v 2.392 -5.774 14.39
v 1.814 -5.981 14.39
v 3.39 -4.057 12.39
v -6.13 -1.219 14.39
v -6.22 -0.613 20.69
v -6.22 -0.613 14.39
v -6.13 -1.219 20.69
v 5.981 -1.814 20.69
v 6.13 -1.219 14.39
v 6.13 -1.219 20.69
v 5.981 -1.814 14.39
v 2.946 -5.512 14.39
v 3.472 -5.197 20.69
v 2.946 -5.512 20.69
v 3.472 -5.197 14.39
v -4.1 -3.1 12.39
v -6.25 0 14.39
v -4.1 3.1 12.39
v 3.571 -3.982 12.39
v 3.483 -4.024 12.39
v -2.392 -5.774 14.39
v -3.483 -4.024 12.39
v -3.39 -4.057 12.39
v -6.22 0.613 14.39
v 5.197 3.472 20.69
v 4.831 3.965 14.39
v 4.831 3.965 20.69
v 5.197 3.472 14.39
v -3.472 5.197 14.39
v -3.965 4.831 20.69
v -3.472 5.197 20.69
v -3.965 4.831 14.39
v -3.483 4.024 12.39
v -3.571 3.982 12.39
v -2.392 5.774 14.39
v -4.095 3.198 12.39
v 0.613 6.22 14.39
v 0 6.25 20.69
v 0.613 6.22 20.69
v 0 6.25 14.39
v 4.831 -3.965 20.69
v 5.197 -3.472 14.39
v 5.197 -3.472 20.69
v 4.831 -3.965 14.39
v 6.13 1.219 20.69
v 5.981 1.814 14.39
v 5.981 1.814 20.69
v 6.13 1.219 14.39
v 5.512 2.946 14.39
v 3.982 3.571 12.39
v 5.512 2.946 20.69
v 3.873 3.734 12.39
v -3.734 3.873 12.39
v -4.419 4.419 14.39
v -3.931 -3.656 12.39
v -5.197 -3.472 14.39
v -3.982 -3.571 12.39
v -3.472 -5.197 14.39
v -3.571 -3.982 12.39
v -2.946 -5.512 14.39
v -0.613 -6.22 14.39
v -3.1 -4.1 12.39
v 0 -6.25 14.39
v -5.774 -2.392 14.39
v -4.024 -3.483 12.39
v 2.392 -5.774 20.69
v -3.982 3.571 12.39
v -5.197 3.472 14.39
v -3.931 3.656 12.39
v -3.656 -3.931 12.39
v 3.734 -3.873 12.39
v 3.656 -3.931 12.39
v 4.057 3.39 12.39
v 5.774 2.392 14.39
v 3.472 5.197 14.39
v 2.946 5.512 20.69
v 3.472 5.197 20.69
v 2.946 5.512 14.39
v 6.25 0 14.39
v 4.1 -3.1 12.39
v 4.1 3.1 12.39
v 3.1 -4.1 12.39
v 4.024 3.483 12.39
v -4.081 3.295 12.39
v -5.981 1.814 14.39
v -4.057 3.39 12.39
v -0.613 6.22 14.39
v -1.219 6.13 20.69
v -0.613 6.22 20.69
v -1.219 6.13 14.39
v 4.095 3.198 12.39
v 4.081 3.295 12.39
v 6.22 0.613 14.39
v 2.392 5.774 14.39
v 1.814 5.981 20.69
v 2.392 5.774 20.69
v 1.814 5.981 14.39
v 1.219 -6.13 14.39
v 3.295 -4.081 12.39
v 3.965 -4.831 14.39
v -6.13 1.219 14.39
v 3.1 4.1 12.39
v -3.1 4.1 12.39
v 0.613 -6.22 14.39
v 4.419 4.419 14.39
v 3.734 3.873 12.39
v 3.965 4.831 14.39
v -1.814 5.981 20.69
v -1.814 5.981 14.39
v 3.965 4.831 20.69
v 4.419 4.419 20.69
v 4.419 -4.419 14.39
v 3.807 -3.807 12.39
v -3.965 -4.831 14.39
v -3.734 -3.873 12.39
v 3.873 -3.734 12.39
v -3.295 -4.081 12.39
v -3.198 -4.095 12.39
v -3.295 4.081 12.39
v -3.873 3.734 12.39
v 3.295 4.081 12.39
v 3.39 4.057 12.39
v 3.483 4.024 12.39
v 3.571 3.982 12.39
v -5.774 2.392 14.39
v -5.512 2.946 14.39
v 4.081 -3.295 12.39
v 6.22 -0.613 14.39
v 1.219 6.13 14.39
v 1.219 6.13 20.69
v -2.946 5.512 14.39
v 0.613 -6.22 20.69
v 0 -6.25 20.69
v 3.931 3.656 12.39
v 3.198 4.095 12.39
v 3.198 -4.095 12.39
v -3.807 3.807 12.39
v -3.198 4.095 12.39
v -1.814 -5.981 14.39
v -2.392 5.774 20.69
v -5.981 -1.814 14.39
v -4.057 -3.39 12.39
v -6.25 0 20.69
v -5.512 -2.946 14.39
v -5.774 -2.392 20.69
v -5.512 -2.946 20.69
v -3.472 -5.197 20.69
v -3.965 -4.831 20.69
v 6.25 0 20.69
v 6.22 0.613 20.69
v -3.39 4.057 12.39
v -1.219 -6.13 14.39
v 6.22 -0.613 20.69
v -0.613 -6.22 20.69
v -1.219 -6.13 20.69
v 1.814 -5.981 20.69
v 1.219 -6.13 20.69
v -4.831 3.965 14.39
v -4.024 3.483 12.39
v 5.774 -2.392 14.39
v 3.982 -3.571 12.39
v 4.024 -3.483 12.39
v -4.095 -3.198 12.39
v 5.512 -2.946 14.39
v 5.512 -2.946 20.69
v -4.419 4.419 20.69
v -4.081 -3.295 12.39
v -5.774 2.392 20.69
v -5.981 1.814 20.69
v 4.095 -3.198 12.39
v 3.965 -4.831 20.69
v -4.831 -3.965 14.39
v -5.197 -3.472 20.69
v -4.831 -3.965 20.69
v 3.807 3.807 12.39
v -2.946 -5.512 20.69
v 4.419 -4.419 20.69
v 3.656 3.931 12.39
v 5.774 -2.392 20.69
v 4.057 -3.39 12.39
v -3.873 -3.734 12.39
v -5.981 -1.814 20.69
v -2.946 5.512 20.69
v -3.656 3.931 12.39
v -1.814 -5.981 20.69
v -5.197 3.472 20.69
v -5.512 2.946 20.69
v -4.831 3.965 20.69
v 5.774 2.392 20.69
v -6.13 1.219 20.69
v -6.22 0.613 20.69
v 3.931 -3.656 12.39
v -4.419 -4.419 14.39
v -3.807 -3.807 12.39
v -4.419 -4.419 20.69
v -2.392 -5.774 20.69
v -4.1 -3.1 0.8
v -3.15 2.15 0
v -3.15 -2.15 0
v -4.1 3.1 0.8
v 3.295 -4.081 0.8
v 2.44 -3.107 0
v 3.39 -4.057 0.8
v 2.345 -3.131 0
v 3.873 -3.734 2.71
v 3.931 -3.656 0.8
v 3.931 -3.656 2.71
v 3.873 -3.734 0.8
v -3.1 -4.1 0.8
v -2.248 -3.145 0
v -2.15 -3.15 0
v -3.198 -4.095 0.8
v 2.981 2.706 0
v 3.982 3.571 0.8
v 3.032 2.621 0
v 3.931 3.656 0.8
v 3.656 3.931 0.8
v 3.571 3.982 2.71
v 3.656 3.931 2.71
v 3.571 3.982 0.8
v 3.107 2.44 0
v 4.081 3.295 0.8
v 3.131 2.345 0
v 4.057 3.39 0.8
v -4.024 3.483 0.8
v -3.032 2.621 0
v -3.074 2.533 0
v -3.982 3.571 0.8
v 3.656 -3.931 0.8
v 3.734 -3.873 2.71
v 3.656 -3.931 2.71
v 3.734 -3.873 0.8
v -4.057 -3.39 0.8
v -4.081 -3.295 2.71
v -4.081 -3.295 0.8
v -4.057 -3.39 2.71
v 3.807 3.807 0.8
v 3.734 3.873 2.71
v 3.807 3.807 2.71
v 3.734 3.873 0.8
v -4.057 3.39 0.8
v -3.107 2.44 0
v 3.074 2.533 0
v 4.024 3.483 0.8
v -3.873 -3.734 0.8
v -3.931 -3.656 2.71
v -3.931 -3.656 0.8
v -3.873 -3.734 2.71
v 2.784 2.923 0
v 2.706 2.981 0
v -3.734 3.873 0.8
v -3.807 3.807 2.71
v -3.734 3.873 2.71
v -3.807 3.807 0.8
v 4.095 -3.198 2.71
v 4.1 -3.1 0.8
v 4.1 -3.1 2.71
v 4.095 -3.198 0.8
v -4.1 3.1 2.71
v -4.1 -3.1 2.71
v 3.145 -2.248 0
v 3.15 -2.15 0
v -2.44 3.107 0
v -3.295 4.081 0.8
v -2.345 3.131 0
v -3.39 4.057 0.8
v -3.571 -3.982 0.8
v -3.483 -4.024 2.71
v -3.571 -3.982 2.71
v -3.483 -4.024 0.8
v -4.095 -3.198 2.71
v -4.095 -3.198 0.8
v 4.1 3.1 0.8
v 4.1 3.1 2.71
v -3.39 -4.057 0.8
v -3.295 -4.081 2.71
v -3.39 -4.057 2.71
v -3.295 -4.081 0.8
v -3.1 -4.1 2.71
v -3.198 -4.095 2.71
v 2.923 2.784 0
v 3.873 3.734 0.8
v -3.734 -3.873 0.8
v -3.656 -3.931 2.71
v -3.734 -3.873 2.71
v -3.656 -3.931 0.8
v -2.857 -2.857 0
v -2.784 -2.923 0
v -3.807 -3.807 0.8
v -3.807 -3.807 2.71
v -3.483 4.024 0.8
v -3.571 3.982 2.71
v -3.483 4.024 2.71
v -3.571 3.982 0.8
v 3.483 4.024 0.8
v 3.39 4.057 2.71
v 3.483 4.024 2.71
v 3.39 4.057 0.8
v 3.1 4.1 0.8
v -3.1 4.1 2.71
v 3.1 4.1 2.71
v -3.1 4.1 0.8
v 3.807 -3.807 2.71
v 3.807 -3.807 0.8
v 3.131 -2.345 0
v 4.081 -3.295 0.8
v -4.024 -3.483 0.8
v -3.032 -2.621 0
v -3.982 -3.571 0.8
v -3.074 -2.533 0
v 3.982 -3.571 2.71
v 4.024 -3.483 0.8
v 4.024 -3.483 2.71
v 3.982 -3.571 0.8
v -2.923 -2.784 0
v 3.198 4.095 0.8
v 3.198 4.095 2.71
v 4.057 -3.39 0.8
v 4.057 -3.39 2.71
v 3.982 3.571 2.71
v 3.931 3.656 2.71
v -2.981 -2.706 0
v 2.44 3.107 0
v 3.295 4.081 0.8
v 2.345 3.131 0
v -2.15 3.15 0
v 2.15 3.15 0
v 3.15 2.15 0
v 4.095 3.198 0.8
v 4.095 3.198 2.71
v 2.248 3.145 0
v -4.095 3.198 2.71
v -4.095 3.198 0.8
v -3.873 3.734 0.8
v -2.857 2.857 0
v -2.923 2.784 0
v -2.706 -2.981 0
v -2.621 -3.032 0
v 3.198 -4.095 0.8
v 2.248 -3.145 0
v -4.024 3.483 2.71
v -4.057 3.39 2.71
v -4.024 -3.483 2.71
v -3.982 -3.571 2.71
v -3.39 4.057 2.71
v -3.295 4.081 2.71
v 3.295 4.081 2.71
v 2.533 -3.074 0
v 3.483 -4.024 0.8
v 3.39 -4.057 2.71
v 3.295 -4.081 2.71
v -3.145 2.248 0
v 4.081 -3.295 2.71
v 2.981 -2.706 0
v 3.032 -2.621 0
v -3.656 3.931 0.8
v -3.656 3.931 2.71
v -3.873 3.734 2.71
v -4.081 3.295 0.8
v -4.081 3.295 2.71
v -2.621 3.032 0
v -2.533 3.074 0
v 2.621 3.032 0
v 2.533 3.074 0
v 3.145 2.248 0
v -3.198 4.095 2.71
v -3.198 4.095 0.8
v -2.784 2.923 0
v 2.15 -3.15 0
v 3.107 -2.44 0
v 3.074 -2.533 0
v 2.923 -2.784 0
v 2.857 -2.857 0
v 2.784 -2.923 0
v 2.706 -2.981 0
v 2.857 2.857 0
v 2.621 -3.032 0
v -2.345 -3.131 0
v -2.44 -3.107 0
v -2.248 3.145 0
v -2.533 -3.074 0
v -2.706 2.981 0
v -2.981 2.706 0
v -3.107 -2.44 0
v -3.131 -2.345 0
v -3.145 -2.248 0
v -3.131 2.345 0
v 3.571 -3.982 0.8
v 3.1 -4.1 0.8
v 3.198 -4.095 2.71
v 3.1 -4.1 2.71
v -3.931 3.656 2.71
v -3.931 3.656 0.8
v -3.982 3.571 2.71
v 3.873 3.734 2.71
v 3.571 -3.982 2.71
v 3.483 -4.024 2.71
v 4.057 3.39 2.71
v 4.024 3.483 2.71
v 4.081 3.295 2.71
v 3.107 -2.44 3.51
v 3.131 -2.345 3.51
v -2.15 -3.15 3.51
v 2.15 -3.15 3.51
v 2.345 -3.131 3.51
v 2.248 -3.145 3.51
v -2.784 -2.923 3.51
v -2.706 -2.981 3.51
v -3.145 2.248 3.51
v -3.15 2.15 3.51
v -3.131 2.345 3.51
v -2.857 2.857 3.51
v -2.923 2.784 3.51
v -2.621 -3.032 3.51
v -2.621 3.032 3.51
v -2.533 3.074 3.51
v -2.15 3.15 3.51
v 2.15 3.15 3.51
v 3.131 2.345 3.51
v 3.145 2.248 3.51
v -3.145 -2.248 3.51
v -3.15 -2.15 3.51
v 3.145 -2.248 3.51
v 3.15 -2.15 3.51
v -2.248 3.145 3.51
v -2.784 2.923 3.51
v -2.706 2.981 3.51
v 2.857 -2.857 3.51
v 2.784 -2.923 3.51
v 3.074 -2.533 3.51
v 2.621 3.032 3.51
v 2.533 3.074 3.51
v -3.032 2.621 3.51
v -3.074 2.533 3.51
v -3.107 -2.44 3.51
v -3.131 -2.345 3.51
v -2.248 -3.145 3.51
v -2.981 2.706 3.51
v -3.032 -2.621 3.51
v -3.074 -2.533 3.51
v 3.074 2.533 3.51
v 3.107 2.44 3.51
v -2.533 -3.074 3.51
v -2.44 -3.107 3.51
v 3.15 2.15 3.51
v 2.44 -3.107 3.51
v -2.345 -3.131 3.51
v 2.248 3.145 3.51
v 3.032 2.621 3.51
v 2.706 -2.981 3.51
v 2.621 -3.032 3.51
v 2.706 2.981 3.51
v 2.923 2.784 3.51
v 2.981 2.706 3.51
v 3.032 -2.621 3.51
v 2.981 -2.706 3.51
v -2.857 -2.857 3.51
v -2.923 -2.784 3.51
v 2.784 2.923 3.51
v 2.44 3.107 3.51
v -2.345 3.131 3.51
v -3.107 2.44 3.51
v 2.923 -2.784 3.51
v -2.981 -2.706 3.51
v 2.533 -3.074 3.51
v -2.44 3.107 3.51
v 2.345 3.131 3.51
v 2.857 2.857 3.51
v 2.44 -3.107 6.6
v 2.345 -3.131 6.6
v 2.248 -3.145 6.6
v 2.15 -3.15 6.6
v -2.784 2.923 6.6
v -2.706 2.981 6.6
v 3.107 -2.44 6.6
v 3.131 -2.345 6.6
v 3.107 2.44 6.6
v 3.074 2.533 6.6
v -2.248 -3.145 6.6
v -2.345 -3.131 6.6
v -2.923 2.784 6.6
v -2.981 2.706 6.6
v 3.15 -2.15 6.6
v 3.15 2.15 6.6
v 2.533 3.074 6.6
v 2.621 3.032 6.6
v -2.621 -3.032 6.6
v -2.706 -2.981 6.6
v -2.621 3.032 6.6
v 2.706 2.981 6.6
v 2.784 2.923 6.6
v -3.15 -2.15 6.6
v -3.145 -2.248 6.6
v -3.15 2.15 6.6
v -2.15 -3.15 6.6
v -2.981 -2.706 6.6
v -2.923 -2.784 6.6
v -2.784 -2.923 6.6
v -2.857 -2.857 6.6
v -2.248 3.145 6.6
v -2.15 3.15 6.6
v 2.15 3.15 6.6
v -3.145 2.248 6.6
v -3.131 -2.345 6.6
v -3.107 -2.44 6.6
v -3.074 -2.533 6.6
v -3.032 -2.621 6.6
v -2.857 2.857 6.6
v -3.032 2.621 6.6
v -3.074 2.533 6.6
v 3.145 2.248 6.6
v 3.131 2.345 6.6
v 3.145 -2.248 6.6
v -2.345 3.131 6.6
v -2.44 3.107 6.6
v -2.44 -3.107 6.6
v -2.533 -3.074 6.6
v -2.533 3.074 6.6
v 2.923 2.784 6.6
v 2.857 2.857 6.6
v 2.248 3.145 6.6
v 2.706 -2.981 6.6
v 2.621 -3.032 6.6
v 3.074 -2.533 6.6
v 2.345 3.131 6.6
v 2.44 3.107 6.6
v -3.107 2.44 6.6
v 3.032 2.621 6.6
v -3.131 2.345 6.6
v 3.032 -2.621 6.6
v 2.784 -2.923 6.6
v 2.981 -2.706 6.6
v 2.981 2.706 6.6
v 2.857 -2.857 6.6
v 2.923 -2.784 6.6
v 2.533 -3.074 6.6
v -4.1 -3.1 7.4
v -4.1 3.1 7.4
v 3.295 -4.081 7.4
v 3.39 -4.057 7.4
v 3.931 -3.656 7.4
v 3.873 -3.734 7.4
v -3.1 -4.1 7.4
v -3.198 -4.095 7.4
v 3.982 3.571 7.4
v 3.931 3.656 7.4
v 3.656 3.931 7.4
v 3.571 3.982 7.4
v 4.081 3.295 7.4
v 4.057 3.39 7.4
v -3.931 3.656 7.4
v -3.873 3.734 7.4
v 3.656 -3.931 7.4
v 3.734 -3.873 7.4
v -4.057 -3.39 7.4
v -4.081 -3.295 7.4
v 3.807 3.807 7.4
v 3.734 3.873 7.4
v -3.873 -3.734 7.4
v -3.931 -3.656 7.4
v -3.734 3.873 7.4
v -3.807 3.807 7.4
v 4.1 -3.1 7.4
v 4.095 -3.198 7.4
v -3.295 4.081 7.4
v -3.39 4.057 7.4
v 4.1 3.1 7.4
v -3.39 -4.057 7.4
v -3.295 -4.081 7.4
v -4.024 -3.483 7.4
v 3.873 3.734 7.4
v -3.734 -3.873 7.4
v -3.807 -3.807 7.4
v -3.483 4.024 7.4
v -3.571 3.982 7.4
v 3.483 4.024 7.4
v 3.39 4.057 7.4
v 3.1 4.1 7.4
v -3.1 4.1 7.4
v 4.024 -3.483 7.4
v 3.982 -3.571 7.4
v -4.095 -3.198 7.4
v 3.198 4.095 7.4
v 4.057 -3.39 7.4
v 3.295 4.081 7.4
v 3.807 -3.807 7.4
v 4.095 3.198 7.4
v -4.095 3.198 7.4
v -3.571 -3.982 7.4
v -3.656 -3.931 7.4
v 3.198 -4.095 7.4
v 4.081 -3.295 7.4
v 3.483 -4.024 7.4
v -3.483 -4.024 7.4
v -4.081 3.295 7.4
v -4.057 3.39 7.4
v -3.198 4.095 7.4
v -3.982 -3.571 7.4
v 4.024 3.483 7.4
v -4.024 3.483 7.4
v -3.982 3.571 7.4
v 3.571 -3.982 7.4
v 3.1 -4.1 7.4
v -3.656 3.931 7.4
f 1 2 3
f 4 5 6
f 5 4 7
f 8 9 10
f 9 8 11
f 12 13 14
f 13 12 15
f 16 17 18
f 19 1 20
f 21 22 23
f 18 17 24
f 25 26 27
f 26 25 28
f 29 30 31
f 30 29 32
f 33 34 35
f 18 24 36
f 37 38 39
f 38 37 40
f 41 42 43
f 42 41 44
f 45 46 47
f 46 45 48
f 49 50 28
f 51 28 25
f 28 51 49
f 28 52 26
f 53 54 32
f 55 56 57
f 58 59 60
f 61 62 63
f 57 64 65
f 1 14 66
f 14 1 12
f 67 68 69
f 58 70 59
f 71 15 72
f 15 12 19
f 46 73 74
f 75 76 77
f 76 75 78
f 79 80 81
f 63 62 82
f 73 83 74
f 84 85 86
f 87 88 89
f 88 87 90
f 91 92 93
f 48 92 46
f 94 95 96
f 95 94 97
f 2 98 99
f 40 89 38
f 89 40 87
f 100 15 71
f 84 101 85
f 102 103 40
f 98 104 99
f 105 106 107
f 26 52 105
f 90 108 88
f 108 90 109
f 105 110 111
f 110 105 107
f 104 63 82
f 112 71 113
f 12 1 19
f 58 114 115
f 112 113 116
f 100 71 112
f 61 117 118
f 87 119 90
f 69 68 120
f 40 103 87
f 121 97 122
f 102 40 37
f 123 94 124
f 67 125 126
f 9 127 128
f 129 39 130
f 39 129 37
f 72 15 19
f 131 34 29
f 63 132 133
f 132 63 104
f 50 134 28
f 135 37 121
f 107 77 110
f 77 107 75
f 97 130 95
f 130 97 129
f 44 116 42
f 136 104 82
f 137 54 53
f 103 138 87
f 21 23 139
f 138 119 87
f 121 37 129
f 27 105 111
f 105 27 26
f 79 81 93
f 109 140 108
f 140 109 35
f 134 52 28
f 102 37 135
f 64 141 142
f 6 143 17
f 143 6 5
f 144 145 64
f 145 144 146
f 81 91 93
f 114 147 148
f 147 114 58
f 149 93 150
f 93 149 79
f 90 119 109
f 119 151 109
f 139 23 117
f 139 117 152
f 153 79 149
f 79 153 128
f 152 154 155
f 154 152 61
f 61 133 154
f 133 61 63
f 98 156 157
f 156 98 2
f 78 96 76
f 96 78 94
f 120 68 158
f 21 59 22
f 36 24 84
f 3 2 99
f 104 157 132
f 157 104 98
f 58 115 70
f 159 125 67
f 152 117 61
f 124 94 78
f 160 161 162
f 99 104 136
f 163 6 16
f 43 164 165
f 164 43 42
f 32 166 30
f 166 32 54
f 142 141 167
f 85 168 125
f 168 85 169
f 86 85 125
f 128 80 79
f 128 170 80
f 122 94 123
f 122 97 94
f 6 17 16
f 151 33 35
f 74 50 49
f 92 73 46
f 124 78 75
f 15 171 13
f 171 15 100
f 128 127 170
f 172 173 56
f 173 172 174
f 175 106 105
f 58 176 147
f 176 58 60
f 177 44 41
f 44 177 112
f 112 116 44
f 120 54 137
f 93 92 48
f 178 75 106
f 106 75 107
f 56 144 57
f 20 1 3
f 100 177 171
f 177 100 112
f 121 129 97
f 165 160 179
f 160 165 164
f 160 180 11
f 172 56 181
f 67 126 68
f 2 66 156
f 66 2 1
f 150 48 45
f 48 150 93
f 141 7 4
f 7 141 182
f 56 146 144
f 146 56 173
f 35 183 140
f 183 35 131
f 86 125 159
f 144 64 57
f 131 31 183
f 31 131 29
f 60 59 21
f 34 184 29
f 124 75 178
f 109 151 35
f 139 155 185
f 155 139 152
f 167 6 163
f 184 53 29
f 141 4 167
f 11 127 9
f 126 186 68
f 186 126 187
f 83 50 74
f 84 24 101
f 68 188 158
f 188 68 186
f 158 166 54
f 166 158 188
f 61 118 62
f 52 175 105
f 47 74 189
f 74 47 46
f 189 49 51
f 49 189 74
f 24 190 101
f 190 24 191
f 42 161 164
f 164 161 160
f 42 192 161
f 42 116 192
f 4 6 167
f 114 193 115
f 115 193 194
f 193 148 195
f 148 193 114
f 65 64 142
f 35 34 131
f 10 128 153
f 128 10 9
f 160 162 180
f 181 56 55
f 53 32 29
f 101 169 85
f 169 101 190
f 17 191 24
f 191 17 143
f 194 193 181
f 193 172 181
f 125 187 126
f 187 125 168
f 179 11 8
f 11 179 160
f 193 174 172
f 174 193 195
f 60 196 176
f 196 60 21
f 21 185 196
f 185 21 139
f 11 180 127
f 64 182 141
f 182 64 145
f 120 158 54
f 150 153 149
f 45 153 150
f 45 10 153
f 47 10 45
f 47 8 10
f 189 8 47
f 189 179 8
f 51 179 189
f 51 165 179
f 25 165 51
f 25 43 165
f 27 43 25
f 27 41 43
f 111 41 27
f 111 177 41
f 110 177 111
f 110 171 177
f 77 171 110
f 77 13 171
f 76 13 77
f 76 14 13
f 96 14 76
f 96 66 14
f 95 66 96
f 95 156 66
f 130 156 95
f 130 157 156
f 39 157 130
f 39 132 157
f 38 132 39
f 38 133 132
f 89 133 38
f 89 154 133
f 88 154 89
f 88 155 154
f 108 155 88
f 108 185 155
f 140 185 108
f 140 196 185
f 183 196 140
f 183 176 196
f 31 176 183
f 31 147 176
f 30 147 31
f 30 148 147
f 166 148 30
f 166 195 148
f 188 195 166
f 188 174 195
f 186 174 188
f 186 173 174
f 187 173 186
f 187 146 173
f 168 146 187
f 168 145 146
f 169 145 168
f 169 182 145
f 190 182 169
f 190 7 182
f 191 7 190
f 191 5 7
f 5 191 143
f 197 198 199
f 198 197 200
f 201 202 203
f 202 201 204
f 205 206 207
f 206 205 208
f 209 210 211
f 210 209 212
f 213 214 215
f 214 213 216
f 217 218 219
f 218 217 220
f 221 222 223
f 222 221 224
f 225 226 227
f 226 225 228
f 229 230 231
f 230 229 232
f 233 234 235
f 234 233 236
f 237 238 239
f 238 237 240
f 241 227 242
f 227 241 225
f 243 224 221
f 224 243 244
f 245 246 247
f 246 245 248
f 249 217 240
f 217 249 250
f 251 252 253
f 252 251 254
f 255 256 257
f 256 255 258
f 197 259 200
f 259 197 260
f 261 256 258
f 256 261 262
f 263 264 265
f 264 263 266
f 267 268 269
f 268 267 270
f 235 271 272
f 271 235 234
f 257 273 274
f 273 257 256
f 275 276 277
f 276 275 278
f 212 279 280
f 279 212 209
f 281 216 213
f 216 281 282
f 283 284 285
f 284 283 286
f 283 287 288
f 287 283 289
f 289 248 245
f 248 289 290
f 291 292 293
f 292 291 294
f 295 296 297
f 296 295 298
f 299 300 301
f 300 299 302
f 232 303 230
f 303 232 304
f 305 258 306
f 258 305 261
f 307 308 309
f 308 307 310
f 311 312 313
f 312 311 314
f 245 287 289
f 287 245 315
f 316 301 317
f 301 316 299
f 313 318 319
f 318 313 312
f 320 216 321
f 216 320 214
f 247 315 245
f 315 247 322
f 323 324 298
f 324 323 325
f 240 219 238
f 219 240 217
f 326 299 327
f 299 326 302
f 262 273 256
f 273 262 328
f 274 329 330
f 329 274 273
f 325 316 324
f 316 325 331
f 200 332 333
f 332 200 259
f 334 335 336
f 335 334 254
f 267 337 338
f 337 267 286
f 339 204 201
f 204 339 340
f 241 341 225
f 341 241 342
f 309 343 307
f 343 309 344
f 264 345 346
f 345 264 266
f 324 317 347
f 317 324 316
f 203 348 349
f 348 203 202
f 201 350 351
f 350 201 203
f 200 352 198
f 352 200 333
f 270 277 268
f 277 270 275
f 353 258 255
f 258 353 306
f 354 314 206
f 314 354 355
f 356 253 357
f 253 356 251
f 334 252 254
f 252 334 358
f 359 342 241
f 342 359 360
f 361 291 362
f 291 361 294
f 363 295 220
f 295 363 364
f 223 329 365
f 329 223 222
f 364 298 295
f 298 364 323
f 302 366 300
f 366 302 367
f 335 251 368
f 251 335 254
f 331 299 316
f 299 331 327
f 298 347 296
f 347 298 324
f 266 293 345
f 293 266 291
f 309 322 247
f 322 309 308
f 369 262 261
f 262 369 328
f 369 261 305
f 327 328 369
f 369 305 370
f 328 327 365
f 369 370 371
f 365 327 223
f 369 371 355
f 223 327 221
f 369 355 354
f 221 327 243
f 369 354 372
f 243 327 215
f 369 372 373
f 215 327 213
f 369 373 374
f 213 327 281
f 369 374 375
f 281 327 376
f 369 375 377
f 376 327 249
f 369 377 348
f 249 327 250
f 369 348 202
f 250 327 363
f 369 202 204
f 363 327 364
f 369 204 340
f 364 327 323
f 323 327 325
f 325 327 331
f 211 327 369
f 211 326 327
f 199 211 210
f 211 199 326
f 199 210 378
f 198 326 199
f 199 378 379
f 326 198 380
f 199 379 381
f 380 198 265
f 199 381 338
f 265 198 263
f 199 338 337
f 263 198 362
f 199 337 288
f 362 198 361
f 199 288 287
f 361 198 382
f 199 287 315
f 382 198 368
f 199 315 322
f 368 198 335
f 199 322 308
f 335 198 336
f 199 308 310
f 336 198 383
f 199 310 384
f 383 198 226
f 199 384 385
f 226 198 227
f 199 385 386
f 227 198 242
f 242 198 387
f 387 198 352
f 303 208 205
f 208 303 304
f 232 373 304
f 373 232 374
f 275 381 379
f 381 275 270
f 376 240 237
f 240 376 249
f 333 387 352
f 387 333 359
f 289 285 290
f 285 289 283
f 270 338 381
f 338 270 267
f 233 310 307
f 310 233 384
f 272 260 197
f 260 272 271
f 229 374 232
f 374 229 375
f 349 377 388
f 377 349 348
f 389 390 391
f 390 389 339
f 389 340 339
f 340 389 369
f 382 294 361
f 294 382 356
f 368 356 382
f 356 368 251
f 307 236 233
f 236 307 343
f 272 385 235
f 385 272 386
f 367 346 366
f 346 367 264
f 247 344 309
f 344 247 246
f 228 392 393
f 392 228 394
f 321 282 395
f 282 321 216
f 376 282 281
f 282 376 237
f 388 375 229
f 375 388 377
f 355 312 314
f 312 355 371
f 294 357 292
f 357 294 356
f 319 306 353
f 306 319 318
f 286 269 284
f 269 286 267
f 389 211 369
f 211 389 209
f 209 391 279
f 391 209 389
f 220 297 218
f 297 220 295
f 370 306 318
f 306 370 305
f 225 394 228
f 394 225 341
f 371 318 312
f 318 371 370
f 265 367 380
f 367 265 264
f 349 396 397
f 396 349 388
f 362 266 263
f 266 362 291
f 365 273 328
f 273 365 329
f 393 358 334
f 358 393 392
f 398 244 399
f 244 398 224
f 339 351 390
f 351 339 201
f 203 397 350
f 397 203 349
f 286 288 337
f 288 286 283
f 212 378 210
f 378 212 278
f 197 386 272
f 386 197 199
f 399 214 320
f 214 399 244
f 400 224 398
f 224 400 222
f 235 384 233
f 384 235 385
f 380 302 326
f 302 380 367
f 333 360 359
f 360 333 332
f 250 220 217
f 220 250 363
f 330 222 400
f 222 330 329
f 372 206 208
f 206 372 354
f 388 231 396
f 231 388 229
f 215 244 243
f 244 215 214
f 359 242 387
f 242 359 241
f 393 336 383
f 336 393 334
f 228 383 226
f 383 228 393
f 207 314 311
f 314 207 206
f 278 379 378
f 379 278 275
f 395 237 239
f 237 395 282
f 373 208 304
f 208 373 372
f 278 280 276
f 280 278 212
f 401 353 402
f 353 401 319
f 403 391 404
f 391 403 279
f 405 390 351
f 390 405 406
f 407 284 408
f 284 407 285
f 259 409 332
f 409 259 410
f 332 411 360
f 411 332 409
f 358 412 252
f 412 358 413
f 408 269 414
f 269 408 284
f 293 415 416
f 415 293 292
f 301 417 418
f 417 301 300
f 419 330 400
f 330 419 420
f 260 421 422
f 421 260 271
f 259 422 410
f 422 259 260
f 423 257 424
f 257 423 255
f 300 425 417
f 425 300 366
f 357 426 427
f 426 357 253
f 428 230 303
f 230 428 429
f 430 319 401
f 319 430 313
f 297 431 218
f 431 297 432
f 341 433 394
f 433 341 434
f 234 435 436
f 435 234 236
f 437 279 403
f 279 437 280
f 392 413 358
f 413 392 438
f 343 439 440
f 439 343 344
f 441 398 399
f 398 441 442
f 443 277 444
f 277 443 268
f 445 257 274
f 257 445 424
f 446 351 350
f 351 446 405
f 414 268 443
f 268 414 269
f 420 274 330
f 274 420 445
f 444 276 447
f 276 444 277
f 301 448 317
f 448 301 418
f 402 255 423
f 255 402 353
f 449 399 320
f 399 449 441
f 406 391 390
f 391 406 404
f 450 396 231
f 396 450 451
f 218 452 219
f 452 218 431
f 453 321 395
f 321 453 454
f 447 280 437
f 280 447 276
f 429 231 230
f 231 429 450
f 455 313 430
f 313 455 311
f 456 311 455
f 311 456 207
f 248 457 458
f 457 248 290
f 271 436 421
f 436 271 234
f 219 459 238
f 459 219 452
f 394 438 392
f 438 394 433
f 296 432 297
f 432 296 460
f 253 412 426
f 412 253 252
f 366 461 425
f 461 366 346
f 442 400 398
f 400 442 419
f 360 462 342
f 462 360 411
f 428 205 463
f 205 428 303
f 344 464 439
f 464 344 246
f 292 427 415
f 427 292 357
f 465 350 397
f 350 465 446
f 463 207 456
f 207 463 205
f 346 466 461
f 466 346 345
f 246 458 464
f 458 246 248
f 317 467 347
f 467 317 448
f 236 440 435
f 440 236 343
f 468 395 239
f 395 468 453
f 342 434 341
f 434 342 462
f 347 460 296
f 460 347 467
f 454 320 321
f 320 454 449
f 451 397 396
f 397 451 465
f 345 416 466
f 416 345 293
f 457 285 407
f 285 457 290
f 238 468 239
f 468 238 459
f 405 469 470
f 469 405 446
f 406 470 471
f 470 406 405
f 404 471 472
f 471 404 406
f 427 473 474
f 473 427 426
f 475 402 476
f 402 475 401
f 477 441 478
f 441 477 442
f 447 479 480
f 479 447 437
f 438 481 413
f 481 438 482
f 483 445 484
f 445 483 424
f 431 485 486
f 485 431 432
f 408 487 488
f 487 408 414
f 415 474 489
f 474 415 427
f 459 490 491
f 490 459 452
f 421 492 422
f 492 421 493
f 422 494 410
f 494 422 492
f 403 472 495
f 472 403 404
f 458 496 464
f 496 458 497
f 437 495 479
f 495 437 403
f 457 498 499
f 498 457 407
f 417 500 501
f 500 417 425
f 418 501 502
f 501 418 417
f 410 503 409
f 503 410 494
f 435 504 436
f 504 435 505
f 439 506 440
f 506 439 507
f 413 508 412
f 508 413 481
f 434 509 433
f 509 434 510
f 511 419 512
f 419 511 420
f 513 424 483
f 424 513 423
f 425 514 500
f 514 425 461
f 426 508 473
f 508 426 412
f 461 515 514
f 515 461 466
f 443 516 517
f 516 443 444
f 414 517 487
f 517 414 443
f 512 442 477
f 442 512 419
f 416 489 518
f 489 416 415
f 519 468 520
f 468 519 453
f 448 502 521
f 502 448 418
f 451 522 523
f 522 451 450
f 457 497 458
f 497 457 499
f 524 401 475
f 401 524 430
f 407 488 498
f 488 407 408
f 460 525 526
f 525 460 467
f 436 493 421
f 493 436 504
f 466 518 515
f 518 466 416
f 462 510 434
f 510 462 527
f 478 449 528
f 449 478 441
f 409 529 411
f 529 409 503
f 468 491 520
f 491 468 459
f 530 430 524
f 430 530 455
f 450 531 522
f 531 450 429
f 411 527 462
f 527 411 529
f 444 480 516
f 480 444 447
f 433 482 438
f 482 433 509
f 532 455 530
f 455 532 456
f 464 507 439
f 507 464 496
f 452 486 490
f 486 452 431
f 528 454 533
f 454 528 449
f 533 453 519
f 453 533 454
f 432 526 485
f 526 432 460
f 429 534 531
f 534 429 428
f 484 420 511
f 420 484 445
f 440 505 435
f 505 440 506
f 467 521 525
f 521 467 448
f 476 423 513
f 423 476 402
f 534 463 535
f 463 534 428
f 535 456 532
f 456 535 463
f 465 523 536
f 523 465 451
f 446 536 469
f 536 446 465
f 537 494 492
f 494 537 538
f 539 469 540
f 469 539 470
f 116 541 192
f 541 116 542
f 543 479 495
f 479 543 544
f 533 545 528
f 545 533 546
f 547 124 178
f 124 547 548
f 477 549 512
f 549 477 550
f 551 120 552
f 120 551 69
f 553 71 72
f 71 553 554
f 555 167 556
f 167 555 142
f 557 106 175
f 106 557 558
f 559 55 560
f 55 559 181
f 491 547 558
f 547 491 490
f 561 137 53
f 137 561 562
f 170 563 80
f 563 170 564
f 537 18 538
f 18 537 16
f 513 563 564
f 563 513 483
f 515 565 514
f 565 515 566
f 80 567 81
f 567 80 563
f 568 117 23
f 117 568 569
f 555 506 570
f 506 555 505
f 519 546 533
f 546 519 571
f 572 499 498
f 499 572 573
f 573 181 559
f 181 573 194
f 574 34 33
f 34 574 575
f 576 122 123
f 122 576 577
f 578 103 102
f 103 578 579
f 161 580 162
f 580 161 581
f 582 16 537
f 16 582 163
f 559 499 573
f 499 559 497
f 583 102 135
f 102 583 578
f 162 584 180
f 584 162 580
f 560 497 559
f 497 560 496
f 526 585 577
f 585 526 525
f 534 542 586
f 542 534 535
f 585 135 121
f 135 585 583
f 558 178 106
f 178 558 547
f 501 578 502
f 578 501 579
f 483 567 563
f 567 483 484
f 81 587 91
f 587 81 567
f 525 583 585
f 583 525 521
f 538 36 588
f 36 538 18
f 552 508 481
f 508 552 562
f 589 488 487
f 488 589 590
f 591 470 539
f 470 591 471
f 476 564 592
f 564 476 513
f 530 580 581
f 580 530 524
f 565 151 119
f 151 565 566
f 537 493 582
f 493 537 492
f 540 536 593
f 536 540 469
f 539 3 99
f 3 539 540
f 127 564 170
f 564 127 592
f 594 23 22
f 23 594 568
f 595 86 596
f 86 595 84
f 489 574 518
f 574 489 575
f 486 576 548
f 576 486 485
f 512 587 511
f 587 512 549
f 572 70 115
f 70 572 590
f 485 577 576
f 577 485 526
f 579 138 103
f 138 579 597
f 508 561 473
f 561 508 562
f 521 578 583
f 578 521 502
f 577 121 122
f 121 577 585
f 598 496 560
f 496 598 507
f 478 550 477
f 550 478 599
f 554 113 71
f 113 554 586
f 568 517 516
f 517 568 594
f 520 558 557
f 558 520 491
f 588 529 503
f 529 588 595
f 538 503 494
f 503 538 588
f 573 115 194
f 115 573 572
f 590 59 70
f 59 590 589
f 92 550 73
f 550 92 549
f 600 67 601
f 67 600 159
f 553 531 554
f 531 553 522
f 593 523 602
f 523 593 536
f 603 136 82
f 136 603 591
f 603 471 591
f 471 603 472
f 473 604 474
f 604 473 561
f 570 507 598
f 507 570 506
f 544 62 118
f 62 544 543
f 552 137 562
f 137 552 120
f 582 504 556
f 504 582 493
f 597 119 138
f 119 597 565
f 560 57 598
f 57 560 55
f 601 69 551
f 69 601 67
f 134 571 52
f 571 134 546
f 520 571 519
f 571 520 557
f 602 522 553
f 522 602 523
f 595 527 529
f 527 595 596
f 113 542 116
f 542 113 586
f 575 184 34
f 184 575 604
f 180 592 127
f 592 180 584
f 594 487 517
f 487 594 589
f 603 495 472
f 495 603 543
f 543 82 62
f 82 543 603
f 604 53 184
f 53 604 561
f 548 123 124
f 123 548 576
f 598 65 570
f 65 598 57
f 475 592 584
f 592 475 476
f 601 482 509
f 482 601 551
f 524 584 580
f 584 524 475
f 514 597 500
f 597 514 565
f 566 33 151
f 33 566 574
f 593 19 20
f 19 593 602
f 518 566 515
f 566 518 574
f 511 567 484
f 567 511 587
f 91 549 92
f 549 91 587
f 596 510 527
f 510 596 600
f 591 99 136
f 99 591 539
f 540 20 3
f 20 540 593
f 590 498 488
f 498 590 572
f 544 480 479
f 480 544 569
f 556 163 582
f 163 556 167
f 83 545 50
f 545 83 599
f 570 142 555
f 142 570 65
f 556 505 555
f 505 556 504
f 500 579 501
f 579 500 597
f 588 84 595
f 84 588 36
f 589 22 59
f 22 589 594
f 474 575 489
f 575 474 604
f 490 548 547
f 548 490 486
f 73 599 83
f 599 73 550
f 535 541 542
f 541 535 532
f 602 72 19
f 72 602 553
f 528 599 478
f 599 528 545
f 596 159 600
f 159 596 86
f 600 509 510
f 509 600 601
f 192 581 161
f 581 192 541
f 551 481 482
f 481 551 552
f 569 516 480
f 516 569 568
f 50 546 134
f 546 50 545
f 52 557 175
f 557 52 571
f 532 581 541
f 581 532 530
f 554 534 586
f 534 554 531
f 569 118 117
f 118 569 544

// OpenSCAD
// file: _connection.scad
// =====================================
// Fisher-Price Power Workshop - Shared Connection
// Common square-peg connection shared by all attachments
// See CONNECTION_SPEC.md for measurement details
// =====================================

// ---- Connection Parameters (mm) ----

// Square shaft (male end - plugs into handle)
// Measured from calipers on existing attachment
shaft_sq = 8.2;          // side length
shaft_sq_length = 12.4;  // total length of square shaft (3.5 + 3.1 + 5.8)

// Snap groove in the square shaft
groove_pos = 3.5 + 3.1/2;   // from tip (z=0) to groove center
groove_width = 3.1;      // width of the groove
groove_depth = 0.95;     // per side: (8.2 - 6.3) / 2
groove_bevel = 0.8;      // taper height at each end of groove
tip_bevel = 0.8;         // taper height at tip for insertion guide
corner_r = 1.0;          // corner rounding radius on male shaft (mimics injection-molded originals)

// Transition collar
collar_diameter = 12.5;  // measured
collar_length = 8.3;     // measured
collar_bevel = 2.0;      // taper from square shaft to round collar

// Square socket (female end - accepts male shaft)
// Sized to accept shaft with clearance
socket_size = 8.6;      // side length (+0.4mm clearance over 8.2mm shaft)
socket_depth = 13;      // depth of square socket (accepts 12.4mm shaft)
socket_lead_in = 1.2;   // chamfer depth at the opening to reduce catching

// Snap ridge inside socket (mates with groove on attachments)
ridge_pos = 7.35;       // from opening; aligns with groove when shaft inserted
ridge_width = 3.1;      // matches groove width
ridge_depth = 0.95;     // matches groove depth
ridge_bevel = 0.8;      // taper height at each end of ridge (matches groove_bevel)

// ---- Connection Modules ----

// 2D profile for corner-only snap ridge.
// Intersecting the socket square with a 45-degree-rotated square creates an
// octagon — material protrudes only at the four corners, allowing the shaft
// to push past with moderate force while still snapping into the groove for
// retention.
module _ridge_profile() {
    intersection() {
        square(socket_size, center=true);
        rotate([0, 0, 45])
            square(socket_size * sqrt(2) - ridge_depth * 2, center=true);
    }
}

// 2D rounded-square profile for male shaft cross-sections.
// Shrinks inward then rounds back outward so the result is the same side
// length with corners rounded at corner_r radius.
module _shaft_profile(size) {
    offset(r = corner_r) offset(delta = -corner_r)
        square(size, center = true);
}

// Square plug shaft with snap groove and beveled transitions
module sq_shaft() {
    groove_start = groove_pos - groove_width/2;
    groove_end = groove_pos + groove_width/2;
    groove_sq = shaft_sq - groove_depth * 2;

    // Tip bevel (matches groove transition style)
    hull() {
        linear_extrude(0.01)
            _shaft_profile(groove_sq);
        translate([0, 0, tip_bevel])
            linear_extrude(0.01)
                _shaft_profile(shaft_sq);
    }

    // Remaining tip section
    translate([0, 0, tip_bevel])
        linear_extrude(groove_start - groove_bevel - tip_bevel)
            _shaft_profile(shaft_sq);

    // Bevel into groove
    hull() {
        translate([0, 0, groove_start - groove_bevel])
            linear_extrude(0.01)
                _shaft_profile(shaft_sq);
        translate([0, 0, groove_start])
            linear_extrude(0.01)
                _shaft_profile(groove_sq);
    }

    // Groove
    translate([0, 0, groove_start])
        linear_extrude(groove_width)
            _shaft_profile(groove_sq);

    // Bevel out of groove
    hull() {
        translate([0, 0, groove_end])
            linear_extrude(0.01)
                _shaft_profile(groove_sq);
        translate([0, 0, groove_end + groove_bevel])
            linear_extrude(0.01)
                _shaft_profile(shaft_sq);
    }

    // Main shaft
    translate([0, 0, groove_end + groove_bevel])
        linear_extrude(shaft_sq_length - groove_end - groove_bevel)
            _shaft_profile(shaft_sq);
}

// Square socket with snap ridge and beveled transitions
// Includes a chamfered lead-in at the opening to reduce insertion catching
module square_socket() {
    ridge_start = ridge_pos - ridge_width/2;
    ridge_end = ridge_pos + ridge_width/2;

    // Lead-in chamfer at opening — wider at the entrance, tapers to socket_size at depth
    translate([0, 0, -0.1])
        linear_extrude(socket_lead_in + 0.1, scale = socket_size / (socket_size + 0.8))
            square(socket_size + 0.8, center = true);

    // Below ridge (full-size socket)
    translate([0, 0, socket_lead_in])
        linear_extrude(ridge_start - ridge_bevel - socket_lead_in)
            square(socket_size, center = true);

    // Bevel into ridge
    hull() {
        translate([0, 0, ridge_start - ridge_bevel])
            linear_extrude(0.01)
                square(socket_size, center = true);
        translate([0, 0, ridge_start])
            linear_extrude(0.01)
                _ridge_profile();
    }

    // Ridge section (corner-only octagonal profile)
    translate([0, 0, ridge_start])
        linear_extrude(ridge_width)
            _ridge_profile();

    // Bevel out of ridge
    hull() {
        translate([0, 0, ridge_end])
            linear_extrude(0.01)
                _ridge_profile();
        translate([0, 0, ridge_end + ridge_bevel])
            linear_extrude(0.01)
                square(socket_size, center = true);
    }

    // Above ridge to full depth
    translate([0, 0, ridge_end + ridge_bevel])
        linear_extrude(socket_depth - ridge_end - ridge_bevel + 0.1)
            square(socket_size, center = true);
}

// Transition collar with beveled square-to-round base
module collar() {
    translate([0, 0, shaft_sq_length - 0.01]) {  // -0.01mm overlap with shaft top prevents coplanar faces
        // Taper from square shaft to round collar
        hull() {
            linear_extrude(0.01)
                _shaft_profile(shaft_sq);
            translate([0, 0, collar_bevel])
                cylinder(d = collar_diameter, h = 0.01);
        }
        // Remaining collar
        translate([0, 0, collar_bevel])
            cylinder(d = collar_diameter, h = collar_length - collar_bevel);
    }
}
// main file
// =====================================
// Test print - Male connection (shaft + collar)
// Quick print to verify fit against female socket
// =====================================

include <_connection.scad>

$fn = 64;

// Base plate so it prints flat (collar-down)
// The collar sits on the bed, shaft points up
collar();
sq_shaft();
